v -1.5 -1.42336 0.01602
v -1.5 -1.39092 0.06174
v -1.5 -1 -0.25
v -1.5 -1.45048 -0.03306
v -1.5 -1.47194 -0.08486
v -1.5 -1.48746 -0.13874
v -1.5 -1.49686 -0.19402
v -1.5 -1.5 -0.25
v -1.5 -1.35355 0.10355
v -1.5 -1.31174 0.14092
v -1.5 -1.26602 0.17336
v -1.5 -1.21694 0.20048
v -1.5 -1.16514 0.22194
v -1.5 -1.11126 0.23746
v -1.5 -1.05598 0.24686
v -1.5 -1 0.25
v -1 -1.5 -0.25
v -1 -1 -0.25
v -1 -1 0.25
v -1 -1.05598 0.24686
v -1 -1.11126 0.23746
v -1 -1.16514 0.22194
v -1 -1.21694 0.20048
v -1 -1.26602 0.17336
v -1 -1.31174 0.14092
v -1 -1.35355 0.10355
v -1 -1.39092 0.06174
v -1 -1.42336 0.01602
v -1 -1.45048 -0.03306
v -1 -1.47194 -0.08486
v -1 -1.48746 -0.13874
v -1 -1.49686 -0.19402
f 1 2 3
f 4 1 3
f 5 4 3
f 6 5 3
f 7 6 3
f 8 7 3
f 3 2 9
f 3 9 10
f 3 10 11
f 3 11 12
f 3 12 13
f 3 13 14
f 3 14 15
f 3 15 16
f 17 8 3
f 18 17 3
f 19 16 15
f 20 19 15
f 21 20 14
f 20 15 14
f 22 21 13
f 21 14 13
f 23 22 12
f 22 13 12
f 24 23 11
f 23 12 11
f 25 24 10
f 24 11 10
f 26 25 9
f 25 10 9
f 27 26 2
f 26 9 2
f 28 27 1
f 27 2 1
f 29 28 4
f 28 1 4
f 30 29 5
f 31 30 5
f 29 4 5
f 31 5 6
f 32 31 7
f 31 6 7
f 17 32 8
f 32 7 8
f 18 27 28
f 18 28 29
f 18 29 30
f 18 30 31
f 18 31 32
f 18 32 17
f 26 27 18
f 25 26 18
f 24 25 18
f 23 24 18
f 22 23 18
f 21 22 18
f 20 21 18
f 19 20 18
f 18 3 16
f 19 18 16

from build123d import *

# Parameters (mm, degrees)
SKETCH004_W      = 0.5
SKETCH004_H      = 0.5
EXTRUDE004_DEPTH = 0.5
SKETCH003_R      = 0.5
EXTRUDE003_DEPTH = 0.5


with BuildPart() as extrude004:
    # Sketch004 → Extrude004 (new body)
    with BuildSketch(Plane.YZ.offset(-1.5)):
        with Locations((-1.25, 0)):
            Rectangle(SKETCH004_W, SKETCH004_H)
    extrude(amount=EXTRUDE004_DEPTH)


with BuildPart() as common001:
    # Sketch003 → Extrude003 (new body)
    with BuildSketch(Plane.YZ.offset(-1.5)):
        with Locations((-1, -0.25)):
            Circle(SKETCH003_R)
    extrude(amount=EXTRUDE003_DEPTH)

    # Common001: intersect Extrude004
    add(extrude004.part, mode=Mode.INTERSECT)


solid = common001.part
